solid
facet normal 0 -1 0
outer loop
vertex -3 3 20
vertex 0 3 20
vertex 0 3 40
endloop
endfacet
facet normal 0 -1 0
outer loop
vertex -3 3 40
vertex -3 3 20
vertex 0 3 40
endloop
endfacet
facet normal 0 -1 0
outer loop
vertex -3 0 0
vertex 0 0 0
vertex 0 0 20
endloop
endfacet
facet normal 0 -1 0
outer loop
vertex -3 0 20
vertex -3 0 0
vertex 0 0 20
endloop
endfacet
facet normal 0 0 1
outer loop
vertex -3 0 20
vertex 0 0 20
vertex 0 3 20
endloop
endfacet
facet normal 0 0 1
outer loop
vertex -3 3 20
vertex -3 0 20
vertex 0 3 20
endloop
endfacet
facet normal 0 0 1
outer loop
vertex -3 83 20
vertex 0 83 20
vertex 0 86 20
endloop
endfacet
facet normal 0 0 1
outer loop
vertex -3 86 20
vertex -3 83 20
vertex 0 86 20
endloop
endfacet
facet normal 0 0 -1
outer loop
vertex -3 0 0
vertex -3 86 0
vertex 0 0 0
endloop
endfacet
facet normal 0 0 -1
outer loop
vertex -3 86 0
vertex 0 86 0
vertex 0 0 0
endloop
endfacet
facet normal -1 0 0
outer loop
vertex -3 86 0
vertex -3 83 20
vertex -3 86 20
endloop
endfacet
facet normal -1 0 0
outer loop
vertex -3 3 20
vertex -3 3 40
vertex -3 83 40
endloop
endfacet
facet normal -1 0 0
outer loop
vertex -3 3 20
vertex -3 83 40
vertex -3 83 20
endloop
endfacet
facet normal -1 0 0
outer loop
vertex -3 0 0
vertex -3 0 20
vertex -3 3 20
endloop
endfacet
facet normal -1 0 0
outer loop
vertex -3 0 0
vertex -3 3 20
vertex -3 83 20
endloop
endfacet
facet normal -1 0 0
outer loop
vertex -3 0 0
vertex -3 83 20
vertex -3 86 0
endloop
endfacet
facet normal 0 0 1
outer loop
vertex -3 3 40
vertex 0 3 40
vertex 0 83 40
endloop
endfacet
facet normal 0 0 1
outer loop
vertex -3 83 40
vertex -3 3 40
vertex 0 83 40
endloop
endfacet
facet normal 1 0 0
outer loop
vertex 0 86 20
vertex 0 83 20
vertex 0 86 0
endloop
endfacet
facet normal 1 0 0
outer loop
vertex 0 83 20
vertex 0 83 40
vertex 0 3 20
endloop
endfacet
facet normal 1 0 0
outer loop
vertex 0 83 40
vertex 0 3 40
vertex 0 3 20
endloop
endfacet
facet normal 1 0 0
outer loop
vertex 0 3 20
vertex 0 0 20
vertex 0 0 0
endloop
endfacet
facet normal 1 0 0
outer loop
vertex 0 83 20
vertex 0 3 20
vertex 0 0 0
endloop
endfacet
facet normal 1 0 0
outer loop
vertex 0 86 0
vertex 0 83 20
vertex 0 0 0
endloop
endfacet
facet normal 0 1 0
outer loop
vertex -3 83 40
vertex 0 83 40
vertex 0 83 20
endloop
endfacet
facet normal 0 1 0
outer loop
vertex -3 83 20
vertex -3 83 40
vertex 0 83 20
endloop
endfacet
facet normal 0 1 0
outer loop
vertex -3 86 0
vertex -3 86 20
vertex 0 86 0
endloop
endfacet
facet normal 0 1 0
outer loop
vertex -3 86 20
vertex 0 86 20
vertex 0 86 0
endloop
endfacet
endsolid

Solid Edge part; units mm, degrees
sketch "Sketch1" plane through (0, 0, 0) normal (1, 0, 0) x (0, 1, 0)
  line L0 (3, 40) -> (83, 40)
  line L1 (83, 40) -> (83, 20)
  line L2 (83, 20) -> (86, 20)
  line L3 (86, 20) -> (86, 0)
  line L4 (86, 0) -> (0, 0)
  line L5 (0, 0) -> (0, 20)
  line L6 (0, 20) -> (3, 20)
  line L7 (3, 20) -> (3, 40)
  dimension "D1" = 20
  dimension "D2" = 3
  dimension "D3" = 80
  dimension "D4" = 20
extrude "Protrusion1" add sketch "Sketch1" against normal blind 3
properties material "Acier"
